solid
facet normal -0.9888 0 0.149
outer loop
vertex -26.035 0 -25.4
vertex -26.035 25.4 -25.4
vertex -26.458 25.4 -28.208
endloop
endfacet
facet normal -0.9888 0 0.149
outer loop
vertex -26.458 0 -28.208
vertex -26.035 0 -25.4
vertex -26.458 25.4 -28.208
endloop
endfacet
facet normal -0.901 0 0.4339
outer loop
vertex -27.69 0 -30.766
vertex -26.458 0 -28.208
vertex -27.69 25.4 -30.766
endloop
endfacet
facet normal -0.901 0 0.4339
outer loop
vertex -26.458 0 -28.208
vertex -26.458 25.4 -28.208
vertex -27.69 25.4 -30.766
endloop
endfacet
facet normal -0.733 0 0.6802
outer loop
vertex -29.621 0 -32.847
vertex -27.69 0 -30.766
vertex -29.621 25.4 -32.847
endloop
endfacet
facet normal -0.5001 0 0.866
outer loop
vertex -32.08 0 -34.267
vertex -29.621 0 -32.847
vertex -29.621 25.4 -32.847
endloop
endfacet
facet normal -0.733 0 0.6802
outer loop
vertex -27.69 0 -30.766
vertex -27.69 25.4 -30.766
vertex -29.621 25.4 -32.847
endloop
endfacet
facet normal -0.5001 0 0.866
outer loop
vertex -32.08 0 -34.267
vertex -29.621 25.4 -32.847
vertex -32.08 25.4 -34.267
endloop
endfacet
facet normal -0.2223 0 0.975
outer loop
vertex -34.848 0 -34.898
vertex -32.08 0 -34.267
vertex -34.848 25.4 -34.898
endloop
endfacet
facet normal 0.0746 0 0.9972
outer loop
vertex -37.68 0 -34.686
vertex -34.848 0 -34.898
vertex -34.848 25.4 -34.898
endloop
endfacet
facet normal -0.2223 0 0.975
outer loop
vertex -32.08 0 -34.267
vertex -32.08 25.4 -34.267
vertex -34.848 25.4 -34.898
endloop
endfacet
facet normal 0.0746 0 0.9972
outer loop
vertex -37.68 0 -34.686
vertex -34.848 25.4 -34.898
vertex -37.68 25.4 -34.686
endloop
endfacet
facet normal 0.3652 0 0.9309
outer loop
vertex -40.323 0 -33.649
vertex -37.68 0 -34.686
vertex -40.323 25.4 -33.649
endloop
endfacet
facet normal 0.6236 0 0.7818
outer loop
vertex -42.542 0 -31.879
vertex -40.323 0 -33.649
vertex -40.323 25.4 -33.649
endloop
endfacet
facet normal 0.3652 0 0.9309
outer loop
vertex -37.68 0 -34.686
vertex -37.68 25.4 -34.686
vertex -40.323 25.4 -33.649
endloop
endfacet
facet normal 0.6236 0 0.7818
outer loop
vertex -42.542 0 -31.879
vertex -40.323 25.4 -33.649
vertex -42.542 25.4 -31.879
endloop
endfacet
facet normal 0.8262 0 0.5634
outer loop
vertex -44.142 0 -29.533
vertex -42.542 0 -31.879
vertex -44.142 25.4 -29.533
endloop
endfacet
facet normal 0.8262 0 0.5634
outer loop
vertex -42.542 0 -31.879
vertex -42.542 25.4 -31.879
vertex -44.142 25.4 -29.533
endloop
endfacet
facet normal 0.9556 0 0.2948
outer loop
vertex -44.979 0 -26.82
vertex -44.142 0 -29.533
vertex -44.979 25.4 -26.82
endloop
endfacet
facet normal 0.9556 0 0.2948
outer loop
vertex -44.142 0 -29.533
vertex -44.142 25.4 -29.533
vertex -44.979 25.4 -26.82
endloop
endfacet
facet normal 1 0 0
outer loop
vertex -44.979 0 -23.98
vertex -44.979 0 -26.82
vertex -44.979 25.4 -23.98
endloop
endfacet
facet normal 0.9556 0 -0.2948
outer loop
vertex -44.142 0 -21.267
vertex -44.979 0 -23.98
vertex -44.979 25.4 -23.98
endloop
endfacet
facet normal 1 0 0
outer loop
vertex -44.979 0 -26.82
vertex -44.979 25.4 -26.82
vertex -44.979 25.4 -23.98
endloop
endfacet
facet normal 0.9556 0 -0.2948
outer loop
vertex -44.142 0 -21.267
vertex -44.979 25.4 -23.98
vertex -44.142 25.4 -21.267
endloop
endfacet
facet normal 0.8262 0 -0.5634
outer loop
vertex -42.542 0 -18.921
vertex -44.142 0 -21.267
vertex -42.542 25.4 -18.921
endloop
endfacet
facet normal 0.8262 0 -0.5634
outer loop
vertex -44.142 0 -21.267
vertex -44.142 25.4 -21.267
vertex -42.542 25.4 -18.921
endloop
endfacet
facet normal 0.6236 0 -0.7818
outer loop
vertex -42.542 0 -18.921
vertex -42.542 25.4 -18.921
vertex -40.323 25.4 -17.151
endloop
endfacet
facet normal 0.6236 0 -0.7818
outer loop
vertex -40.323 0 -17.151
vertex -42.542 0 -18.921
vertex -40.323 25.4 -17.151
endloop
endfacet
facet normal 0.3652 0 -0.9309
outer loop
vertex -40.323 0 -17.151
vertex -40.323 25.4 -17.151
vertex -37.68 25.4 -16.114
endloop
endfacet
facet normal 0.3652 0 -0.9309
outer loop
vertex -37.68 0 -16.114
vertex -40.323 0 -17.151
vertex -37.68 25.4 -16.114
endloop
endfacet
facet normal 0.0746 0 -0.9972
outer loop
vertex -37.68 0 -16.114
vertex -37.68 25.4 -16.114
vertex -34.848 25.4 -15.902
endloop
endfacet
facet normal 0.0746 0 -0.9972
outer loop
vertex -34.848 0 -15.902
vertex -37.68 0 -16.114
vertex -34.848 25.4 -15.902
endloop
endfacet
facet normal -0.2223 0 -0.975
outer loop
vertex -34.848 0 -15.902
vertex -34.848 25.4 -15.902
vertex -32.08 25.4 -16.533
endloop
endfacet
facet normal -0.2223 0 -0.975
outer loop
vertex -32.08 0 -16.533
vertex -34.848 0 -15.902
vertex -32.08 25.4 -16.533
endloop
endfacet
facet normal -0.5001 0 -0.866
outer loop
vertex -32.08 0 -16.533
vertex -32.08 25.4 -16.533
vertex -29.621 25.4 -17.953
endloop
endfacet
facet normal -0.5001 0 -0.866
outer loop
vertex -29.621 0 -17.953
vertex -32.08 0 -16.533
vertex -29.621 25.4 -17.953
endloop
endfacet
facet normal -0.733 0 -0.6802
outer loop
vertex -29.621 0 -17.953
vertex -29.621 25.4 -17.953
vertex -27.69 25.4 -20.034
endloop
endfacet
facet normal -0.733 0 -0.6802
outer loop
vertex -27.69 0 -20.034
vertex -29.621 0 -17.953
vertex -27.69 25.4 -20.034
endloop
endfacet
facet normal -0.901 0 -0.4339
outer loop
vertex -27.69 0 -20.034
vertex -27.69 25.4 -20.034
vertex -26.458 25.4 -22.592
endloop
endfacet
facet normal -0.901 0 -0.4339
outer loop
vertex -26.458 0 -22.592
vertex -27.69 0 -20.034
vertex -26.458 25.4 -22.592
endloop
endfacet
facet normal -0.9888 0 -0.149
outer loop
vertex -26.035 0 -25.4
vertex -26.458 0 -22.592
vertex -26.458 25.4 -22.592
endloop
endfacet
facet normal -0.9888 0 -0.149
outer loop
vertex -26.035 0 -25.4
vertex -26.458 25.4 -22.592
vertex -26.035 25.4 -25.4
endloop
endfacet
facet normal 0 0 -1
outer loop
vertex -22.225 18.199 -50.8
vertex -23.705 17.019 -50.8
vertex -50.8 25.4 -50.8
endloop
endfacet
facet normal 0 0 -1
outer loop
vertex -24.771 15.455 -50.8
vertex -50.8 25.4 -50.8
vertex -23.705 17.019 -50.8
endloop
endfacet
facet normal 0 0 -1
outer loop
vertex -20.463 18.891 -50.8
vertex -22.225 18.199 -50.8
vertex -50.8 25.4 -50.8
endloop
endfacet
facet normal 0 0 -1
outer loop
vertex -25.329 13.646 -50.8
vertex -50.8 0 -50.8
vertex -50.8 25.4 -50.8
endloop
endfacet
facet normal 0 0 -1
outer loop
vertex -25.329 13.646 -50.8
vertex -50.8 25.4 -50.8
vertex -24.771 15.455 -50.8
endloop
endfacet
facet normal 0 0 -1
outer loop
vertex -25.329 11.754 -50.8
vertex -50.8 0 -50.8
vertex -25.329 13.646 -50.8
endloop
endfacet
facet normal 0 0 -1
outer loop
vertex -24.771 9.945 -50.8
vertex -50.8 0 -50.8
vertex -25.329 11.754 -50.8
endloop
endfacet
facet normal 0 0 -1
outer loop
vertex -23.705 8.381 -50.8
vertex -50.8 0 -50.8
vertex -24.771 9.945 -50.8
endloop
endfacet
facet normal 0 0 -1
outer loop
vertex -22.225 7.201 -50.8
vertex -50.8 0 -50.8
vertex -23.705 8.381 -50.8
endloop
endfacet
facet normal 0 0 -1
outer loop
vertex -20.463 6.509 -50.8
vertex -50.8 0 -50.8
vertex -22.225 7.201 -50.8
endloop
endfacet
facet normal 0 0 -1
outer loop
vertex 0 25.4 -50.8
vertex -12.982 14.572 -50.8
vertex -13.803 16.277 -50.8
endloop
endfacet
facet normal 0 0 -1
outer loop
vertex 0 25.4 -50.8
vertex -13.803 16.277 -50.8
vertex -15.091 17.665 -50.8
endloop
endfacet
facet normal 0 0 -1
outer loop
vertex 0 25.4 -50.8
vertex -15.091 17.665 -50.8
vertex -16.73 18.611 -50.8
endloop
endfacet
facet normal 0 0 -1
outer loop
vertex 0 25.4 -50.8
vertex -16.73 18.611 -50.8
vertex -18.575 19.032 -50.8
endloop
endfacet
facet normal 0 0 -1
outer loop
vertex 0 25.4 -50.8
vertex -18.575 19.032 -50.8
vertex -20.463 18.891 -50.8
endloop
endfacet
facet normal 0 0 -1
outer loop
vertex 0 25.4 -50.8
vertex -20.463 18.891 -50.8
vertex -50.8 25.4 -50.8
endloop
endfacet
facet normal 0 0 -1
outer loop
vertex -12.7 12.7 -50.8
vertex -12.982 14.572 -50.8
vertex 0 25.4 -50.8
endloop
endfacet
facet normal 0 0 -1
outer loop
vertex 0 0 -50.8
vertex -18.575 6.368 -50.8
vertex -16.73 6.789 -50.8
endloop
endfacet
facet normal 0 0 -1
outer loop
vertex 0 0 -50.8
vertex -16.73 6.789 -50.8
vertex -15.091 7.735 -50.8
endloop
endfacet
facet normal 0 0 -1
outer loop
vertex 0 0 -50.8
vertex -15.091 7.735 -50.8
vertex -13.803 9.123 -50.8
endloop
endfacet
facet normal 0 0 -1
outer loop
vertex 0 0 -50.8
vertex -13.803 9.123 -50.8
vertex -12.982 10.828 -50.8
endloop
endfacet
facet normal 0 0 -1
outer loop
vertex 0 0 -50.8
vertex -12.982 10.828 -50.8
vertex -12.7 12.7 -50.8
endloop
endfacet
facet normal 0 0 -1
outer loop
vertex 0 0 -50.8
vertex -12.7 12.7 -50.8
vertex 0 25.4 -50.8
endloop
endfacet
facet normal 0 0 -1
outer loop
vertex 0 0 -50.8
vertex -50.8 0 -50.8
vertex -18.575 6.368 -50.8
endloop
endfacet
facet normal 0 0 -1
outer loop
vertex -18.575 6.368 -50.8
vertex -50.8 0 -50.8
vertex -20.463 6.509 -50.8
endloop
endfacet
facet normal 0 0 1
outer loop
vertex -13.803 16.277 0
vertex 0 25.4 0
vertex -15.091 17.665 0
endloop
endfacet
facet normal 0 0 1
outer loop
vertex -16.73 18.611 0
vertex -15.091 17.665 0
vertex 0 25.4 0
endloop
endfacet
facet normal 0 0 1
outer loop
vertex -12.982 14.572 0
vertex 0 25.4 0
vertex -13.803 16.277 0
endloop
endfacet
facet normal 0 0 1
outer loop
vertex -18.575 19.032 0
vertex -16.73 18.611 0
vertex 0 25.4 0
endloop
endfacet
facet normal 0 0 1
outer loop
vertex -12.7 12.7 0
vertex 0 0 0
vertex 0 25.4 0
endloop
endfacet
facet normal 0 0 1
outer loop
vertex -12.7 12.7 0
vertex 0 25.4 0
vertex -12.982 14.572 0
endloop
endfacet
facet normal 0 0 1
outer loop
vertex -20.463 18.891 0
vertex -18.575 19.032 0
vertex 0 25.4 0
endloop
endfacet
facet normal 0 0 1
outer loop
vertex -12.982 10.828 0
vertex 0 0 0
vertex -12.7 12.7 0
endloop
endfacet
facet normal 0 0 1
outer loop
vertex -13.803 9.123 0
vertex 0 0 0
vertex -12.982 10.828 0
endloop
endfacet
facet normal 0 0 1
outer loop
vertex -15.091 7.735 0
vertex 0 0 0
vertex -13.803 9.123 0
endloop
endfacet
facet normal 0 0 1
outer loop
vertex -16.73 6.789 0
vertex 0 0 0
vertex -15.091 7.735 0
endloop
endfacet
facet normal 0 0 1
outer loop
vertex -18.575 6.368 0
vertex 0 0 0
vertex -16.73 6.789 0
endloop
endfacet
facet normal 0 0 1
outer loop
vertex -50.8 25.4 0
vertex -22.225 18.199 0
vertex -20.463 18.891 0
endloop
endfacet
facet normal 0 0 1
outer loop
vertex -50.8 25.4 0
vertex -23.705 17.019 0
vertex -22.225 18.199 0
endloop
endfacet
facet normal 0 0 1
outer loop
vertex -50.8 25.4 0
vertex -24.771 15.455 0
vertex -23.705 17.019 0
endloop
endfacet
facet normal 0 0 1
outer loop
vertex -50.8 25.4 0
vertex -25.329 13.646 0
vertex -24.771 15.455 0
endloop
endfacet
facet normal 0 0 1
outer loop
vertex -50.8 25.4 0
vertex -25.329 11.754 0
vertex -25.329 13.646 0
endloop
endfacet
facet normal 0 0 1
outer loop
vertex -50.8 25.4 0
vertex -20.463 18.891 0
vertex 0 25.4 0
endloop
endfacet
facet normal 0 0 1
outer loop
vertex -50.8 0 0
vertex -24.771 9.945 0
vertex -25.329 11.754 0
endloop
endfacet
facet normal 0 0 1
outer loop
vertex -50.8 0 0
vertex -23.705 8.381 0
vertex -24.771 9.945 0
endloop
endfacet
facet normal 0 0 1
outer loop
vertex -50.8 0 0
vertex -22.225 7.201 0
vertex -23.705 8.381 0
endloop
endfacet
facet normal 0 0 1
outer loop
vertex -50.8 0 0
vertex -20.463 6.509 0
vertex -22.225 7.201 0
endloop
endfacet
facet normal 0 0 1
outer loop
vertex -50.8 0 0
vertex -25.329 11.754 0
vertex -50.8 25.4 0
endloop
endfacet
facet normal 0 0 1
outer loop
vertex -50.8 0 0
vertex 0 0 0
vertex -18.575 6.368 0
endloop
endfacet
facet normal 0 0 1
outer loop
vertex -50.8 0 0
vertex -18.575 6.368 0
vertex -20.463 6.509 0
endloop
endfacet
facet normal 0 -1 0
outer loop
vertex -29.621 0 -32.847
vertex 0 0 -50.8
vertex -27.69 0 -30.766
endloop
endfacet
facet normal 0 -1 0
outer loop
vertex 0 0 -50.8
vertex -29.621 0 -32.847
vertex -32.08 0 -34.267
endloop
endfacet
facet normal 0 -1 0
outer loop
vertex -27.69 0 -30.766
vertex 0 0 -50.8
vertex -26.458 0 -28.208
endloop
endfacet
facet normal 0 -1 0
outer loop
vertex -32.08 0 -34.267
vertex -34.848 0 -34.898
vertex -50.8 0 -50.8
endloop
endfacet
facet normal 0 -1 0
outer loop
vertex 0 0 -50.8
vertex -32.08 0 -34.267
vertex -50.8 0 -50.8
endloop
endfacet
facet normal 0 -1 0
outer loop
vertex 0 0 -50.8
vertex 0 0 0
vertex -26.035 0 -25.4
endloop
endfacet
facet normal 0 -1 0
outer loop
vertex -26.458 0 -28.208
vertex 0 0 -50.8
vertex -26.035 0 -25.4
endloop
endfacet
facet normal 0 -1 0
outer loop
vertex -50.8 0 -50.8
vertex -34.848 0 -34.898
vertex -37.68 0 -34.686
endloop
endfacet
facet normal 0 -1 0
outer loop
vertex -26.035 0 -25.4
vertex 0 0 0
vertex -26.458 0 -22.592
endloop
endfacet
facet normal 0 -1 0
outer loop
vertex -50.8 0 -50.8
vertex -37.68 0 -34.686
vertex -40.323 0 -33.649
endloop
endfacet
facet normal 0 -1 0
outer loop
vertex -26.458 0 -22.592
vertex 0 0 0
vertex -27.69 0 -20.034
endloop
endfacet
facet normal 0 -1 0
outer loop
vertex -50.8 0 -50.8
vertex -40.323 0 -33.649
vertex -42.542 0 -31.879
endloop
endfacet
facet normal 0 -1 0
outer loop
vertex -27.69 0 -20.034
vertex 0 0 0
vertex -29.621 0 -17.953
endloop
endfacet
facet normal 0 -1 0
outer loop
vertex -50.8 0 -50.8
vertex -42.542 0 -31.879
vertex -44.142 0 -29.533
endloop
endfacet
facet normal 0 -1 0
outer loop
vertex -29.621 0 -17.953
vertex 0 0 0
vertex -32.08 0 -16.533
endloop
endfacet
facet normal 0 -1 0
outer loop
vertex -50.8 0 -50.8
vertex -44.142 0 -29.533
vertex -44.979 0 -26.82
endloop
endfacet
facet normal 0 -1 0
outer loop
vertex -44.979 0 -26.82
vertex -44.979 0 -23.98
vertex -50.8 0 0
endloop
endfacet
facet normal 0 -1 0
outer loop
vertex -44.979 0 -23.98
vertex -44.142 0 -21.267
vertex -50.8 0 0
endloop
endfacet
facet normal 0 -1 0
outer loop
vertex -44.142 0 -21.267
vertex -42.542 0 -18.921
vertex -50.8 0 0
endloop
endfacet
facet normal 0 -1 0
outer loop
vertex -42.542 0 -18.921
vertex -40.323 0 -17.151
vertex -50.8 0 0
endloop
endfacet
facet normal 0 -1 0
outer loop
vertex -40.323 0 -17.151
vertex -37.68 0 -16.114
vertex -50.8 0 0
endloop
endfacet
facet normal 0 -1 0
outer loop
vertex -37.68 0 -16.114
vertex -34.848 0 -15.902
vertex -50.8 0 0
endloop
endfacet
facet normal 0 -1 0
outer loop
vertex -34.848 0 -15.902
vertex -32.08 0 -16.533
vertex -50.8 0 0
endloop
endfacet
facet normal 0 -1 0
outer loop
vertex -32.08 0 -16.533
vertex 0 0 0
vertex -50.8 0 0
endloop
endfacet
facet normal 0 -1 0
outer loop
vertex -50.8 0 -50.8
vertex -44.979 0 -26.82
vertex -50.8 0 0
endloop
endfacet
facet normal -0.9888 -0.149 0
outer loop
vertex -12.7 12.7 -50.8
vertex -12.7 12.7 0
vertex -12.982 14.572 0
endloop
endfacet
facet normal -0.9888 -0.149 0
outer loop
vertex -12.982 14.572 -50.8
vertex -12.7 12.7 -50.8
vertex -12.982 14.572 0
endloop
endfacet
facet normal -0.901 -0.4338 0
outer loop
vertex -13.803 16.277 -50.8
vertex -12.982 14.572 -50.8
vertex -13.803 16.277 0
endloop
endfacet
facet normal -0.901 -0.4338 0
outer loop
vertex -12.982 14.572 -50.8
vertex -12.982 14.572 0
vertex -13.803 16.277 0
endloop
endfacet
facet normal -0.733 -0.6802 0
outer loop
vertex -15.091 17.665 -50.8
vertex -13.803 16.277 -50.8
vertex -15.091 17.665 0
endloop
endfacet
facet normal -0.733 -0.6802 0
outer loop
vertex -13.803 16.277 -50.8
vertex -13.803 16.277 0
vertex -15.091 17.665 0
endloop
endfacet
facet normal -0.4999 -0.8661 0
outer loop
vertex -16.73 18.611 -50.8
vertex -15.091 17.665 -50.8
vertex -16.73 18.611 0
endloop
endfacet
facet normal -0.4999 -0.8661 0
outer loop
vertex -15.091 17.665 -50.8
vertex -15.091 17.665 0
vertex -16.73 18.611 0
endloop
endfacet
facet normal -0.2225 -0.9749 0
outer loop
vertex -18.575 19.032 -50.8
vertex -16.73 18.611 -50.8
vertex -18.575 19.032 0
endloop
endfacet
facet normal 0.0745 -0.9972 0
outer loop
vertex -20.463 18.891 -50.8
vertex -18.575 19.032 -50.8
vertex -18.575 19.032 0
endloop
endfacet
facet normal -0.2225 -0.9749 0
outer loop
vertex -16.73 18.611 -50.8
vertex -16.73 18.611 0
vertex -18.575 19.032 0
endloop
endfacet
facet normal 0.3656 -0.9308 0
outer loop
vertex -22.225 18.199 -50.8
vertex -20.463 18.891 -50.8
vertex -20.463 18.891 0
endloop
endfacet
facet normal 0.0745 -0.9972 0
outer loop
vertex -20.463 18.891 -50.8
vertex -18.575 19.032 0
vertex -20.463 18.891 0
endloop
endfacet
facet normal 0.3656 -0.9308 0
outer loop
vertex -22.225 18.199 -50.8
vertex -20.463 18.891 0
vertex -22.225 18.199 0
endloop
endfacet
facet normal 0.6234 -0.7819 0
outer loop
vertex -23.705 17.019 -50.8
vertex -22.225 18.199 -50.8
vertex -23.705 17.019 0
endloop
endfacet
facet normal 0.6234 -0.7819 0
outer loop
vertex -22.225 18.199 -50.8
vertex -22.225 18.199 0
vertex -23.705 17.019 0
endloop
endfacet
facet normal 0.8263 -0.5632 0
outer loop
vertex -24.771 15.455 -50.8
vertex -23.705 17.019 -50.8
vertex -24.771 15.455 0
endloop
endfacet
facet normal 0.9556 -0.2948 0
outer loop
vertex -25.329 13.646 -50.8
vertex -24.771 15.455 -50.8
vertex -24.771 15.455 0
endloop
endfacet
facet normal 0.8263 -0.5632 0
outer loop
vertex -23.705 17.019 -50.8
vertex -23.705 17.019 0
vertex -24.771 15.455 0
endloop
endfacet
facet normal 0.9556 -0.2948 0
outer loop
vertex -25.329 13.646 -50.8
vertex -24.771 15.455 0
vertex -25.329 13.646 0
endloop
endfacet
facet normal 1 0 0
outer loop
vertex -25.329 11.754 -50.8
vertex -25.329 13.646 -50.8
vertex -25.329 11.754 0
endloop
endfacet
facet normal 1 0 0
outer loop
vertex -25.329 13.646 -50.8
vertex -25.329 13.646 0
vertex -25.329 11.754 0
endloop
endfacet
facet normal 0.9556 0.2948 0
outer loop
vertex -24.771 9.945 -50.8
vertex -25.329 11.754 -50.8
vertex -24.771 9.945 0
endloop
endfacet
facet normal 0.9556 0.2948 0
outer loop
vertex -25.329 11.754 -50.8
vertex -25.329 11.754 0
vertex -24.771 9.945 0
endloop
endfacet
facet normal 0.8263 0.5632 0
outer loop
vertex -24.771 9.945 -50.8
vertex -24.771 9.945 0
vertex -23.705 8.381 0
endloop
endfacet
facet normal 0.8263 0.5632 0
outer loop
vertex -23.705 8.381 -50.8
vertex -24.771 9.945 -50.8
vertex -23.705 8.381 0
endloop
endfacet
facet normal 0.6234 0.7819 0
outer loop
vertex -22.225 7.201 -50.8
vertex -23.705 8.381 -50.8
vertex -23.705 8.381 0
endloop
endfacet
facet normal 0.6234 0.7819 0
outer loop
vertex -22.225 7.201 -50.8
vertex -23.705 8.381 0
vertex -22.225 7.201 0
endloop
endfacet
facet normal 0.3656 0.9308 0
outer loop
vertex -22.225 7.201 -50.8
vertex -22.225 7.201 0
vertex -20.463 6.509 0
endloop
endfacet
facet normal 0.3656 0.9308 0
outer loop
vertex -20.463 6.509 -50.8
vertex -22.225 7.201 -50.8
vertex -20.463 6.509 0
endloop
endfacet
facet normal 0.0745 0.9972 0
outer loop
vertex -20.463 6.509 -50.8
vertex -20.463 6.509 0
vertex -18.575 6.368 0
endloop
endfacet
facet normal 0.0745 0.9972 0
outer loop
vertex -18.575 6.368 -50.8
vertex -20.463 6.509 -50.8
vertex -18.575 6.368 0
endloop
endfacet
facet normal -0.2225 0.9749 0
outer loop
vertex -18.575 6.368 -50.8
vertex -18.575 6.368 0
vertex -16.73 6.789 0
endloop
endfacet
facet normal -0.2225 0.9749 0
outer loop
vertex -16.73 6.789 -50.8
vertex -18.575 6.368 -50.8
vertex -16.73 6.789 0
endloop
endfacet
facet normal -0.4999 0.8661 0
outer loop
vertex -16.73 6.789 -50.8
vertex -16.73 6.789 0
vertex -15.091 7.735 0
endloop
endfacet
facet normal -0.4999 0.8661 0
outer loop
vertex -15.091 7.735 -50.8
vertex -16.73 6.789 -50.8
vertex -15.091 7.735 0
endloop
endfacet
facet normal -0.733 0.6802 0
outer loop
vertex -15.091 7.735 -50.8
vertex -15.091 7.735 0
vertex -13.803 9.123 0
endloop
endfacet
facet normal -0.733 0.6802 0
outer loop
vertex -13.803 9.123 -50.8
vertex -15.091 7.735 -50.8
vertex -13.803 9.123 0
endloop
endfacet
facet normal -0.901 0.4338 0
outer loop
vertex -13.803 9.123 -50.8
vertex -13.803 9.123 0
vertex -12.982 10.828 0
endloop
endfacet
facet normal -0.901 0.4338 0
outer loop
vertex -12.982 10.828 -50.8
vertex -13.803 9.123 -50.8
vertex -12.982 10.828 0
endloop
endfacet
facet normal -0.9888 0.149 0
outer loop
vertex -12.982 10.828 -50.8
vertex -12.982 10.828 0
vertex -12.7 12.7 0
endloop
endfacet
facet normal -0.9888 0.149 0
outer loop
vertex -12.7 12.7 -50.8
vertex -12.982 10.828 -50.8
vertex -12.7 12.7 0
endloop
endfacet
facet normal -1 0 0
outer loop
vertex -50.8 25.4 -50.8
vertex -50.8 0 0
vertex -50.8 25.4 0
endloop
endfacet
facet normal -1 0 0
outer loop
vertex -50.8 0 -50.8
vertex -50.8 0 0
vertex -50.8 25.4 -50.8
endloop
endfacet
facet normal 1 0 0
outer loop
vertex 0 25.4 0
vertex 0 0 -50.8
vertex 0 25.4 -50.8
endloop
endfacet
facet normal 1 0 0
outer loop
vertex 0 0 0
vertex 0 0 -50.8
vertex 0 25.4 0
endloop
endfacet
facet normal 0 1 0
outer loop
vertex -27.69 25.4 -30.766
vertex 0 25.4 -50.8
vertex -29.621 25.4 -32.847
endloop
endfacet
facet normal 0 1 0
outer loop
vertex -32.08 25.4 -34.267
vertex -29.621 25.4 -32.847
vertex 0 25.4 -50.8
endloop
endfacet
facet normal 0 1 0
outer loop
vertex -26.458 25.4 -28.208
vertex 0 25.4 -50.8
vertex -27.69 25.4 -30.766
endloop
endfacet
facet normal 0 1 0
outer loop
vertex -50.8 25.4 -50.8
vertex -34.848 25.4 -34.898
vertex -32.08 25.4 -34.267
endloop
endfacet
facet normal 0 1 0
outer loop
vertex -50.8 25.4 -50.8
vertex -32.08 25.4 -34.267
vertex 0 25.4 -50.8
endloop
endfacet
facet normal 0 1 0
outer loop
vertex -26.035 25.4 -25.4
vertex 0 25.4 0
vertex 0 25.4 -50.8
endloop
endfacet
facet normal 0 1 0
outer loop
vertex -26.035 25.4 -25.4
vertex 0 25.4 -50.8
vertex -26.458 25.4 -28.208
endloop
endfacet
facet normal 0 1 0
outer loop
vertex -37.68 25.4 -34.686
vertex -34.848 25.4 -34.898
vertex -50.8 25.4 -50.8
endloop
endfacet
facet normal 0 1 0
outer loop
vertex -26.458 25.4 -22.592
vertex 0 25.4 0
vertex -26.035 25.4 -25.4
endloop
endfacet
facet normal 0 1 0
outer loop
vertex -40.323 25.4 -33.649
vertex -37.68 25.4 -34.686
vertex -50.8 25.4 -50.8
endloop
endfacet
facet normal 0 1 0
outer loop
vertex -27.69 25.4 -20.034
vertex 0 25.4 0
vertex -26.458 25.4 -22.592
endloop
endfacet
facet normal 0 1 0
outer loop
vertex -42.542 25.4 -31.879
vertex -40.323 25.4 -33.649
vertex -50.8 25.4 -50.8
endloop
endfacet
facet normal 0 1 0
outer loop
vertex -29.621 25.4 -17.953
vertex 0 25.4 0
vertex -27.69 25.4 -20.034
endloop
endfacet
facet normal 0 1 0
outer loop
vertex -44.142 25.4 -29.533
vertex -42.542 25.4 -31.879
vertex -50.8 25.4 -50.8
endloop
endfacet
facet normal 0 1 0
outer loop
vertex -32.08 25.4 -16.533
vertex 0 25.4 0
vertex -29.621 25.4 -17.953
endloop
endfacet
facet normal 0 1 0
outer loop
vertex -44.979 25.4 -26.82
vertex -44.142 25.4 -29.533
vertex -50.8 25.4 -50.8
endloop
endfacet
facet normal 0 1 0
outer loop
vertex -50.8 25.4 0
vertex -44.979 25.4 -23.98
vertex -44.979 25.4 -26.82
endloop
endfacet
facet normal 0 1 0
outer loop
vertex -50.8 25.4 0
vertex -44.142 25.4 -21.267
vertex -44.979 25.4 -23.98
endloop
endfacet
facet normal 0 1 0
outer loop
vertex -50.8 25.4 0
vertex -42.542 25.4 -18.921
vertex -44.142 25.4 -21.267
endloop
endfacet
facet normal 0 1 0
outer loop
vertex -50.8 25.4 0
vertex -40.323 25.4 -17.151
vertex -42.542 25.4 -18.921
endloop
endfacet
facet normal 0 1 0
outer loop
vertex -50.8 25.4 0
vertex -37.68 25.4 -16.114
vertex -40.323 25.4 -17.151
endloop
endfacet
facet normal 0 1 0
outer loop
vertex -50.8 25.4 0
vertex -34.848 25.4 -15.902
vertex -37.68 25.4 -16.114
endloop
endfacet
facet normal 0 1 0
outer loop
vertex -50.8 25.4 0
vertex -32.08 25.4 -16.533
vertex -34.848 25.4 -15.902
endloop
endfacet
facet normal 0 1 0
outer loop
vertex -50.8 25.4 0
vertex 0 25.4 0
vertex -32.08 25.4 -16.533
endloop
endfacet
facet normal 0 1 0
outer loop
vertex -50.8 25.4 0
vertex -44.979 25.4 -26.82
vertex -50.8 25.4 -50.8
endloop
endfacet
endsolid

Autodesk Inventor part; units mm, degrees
ref_plane "YZ Plane" through (0, 0, 0) normal (1, 0, 0) x (0, 1, 0)
ref_plane "XZ Plane" through (0, 0, 0) normal (0, 1, 0) x (-1, 0, 0)
ref_plane "XY Plane" through (0, 0, 0) normal (0, 0, 1) x (1, 0, 0)
sketch "Sketch1" plane through (0, 0, 0) normal (0, 1, 0) x (-1, 0, 0)
  line L0 (0, 0) -> (50.8, 0)
  line L1 (50.8, 0) -> (50.8, -50.8)
  line L2 (50.8, -50.8) -> (0, -50.8)
  line L3 (0, -50.8) -> (0, 0)
  dimension "d0" = 50.8
  dimension "d1" = 50.8
extrude "Extrusion1" add sketch "Sketch1" along normal blind 25.4
sketch "Sketch2" plane through (-50.8, 0, 0) normal (0, 0, 1) x (1, 0, 0)
  line L0 (50.8, 0) -> (0, 0) construction
  line L1 (50.8, 0) -> (31.75, 0) construction
  line L2 (31.75, 0) -> (31.75, 12.7) construction
  line L3 (31.75, 12.7) -> (50.8, 12.7) construction
  line L4 (50.8, 12.7) -> (50.8, 0) construction
  circle A0 centre (31.75, 12.7) radius 6.35
  dimension "d4" = 19.05
  dimension "d5" = 12.7
  dimension "d6" = 12.7
extrude "Extrusion2" cut sketch "Sketch2" against normal blind 66.675
sketch "Sketch3" plane through (0, 25.4, 0) normal (0, 1, 0) x (1, 0, 0)
  line L0 (-50.8, 0) -> (-35.56, 0) construction
  line L1 (-35.56, 0) -> (-35.56, 25.4) construction
  line L2 (-35.56, 25.4) -> (-50.8, 25.4) construction
  line L3 (-50.8, 25.4) -> (-50.8, 0) construction
  circle A0 centre (-35.56, 25.4) radius 9.525
  point P0 (0, 0)
  dimension "d9" = 15.24
  dimension "d10" = 25.4
  dimension "d11" = 19.05
extrude "Extrusion3" cut sketch "Sketch3" against normal blind 31.75
properties part number "AxleToRodAdapter"
